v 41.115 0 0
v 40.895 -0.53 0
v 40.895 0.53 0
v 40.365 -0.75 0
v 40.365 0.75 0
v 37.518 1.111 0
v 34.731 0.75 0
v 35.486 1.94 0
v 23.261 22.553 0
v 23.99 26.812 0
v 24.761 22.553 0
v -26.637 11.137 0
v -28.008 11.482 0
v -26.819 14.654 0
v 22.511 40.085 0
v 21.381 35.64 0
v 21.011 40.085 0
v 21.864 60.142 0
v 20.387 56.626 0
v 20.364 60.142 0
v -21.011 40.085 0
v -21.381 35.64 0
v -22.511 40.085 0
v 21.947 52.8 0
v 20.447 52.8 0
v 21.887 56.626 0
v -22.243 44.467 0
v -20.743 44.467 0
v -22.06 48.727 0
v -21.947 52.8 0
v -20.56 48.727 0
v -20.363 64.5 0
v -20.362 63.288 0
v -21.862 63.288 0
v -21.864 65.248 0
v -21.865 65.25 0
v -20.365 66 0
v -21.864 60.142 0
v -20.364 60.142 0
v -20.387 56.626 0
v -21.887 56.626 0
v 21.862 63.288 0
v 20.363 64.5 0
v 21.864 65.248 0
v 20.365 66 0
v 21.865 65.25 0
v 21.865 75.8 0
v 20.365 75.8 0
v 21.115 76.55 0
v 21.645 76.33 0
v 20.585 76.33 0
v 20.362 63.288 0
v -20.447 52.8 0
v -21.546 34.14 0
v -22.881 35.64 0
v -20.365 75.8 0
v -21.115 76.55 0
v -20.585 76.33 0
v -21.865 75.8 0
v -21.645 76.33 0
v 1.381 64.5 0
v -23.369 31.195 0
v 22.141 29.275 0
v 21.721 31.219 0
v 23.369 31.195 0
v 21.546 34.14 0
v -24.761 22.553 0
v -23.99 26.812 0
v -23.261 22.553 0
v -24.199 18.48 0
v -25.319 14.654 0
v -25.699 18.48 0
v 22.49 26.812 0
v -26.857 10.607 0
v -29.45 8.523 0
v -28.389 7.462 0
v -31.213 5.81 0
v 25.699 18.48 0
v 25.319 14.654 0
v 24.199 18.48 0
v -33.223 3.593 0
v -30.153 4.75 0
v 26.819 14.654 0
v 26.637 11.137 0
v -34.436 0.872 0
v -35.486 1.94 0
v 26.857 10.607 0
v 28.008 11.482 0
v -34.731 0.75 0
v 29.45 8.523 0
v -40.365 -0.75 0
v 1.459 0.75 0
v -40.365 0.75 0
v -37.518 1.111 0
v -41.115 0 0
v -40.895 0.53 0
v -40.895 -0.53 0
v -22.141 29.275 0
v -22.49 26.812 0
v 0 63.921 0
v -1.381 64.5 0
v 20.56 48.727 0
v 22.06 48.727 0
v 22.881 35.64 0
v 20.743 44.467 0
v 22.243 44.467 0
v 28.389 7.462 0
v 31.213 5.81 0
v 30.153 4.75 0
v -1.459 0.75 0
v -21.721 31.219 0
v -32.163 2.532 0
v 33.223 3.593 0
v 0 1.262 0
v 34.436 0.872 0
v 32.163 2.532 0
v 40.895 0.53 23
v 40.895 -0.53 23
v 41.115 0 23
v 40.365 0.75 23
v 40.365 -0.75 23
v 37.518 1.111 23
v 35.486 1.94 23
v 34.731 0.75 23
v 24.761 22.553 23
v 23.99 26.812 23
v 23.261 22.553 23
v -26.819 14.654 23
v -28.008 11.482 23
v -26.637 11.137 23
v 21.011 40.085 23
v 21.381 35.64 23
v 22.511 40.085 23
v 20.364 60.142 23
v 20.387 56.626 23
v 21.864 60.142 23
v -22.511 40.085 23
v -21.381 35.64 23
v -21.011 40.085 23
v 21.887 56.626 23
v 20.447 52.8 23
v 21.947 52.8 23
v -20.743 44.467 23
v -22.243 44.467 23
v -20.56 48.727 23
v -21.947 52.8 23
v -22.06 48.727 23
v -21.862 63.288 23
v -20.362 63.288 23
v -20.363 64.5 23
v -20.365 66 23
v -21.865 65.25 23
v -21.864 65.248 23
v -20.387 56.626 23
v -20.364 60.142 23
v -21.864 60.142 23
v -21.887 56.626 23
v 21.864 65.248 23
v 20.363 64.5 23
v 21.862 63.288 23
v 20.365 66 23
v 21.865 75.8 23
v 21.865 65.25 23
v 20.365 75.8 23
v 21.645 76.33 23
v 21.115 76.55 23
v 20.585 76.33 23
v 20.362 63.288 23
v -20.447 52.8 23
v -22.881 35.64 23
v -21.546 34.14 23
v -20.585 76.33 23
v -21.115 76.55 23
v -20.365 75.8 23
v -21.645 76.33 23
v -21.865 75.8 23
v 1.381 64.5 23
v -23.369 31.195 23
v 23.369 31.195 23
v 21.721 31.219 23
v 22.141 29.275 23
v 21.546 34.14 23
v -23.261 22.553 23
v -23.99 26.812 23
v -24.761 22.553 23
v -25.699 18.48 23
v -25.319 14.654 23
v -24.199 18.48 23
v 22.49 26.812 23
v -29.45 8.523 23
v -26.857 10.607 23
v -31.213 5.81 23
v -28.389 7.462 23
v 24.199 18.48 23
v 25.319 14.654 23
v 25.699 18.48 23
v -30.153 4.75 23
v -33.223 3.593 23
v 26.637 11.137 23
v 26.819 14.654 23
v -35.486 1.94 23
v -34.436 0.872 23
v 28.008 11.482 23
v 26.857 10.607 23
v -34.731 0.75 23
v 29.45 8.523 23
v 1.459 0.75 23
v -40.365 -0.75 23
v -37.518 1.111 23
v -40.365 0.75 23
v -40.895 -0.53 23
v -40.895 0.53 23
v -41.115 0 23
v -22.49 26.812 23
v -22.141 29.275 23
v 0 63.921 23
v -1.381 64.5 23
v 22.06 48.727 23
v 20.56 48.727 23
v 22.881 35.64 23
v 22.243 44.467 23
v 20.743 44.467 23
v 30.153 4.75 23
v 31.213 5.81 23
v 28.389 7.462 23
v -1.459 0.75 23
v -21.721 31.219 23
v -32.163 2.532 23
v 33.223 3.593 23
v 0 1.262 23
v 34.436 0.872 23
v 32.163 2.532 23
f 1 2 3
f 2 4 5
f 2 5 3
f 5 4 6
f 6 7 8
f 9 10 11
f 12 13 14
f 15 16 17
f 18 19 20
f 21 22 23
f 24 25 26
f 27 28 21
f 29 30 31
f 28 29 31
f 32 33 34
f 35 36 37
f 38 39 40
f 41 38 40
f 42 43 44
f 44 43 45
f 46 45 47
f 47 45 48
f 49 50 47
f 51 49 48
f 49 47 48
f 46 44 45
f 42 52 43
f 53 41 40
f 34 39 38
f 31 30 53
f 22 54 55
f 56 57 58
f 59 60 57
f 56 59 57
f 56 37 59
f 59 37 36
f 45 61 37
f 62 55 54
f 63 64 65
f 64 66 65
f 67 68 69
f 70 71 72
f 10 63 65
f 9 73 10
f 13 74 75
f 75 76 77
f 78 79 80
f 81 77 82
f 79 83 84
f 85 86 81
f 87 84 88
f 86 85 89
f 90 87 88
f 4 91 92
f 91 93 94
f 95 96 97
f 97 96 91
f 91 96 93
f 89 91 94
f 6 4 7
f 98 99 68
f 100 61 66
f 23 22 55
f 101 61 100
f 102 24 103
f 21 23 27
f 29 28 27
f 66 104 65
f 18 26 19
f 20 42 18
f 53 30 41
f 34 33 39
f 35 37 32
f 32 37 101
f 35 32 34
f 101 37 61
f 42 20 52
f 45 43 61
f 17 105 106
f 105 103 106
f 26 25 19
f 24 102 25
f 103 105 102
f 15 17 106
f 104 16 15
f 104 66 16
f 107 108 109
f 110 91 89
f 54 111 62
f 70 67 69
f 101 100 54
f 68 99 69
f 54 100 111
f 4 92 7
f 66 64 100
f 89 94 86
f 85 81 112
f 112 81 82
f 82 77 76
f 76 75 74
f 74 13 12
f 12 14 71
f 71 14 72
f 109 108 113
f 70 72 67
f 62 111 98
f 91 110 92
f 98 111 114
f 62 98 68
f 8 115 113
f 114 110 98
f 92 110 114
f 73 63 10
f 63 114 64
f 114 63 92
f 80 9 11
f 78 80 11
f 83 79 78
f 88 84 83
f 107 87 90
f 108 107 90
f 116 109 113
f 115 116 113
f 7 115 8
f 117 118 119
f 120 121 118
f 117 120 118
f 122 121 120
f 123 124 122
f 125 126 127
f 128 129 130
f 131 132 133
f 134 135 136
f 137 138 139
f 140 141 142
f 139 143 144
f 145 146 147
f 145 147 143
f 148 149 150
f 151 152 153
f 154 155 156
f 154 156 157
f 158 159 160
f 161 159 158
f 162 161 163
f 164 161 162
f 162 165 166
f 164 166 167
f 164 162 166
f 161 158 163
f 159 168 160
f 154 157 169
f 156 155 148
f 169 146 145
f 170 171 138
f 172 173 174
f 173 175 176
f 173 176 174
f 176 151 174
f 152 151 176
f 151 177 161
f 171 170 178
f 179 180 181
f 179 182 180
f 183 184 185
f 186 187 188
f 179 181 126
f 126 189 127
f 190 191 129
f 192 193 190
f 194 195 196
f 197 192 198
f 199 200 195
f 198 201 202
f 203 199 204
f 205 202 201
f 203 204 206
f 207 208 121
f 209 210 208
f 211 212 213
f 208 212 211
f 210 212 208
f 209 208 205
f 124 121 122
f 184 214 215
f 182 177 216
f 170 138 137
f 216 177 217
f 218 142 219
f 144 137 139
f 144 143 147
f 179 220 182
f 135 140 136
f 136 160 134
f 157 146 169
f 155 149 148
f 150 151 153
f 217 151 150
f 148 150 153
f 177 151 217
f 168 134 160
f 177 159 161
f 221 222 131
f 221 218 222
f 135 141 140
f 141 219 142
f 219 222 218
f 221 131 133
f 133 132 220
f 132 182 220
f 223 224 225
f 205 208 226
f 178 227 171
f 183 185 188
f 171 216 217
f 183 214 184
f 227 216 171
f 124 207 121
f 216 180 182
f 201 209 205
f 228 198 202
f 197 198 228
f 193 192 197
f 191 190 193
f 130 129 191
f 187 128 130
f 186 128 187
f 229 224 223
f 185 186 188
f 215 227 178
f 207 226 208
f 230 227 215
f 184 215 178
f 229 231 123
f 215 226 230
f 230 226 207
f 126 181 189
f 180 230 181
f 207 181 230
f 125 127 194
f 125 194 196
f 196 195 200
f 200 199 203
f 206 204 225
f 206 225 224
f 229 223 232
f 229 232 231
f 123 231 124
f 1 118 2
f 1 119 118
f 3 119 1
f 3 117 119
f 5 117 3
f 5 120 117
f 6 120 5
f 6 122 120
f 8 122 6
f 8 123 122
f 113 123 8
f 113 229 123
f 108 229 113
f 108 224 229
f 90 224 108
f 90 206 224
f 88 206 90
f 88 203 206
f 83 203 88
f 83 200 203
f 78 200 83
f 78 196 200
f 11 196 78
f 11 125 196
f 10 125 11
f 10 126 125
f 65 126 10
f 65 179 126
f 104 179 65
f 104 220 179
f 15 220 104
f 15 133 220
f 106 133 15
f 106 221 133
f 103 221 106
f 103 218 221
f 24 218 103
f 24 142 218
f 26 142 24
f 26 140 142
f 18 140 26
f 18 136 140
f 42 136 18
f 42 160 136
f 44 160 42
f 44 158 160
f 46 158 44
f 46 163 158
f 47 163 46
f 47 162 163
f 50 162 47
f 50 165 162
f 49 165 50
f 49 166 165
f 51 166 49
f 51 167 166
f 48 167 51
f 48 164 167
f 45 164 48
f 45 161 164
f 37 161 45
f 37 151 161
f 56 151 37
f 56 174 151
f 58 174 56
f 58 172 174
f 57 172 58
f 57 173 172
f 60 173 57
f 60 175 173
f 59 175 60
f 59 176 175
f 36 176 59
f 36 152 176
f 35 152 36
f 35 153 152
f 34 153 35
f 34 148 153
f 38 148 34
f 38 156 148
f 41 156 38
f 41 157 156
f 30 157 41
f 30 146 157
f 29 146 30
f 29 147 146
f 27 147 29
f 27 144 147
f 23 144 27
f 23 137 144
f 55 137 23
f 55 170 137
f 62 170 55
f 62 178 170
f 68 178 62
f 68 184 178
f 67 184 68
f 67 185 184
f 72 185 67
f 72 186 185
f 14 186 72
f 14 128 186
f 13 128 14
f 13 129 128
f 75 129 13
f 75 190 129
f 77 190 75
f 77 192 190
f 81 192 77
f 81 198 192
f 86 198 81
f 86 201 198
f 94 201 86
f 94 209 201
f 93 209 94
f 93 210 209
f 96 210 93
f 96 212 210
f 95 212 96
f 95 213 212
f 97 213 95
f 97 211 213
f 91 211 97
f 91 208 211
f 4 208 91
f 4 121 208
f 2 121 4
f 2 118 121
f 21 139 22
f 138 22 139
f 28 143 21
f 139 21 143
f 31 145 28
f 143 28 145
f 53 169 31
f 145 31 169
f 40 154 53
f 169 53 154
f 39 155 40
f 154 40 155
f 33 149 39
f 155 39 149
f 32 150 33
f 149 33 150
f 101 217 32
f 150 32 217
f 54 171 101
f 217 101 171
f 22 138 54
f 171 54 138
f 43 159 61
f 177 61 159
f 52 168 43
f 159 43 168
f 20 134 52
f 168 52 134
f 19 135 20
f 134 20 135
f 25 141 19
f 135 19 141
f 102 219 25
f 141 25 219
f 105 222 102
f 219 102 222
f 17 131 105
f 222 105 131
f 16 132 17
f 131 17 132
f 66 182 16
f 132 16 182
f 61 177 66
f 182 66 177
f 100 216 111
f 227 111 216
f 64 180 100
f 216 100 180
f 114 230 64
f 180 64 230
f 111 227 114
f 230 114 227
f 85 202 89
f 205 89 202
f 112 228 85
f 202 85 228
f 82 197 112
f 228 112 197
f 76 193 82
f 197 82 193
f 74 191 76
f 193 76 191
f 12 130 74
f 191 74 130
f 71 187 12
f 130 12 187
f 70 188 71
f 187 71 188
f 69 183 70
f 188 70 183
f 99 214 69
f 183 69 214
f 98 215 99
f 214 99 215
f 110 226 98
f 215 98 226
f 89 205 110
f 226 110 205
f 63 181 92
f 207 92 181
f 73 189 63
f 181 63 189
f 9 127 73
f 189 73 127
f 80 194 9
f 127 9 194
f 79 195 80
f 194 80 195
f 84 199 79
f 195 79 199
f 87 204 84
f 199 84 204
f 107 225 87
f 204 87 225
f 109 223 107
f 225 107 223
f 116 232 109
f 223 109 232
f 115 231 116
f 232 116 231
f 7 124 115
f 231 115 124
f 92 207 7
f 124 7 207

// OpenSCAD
tolerance = 0; // Tolerance for track holder: negative=tighter, positive=looser
baseExtra = 20; // Distance base sticks out from the sides
bridgeHeight = 66; // Height of track holder above ground
bridgeWidth = 40.73; // Track width
supportDepth = 23; // Support depth
attachmentHeight = 9.8; // Track attachment height
thickness = 1.5; // Thickness of edges

module ribbon(points, thickness=1, closed=false) {
    p = closed ? concat(points, [points[0]]) : points;
    
    union() {
        for (i=[1:len(p)-1]) {
            hull() {
                translate(p[i-1]) circle(d=thickness, $fn=8);
                translate(p[i]) circle(d=thickness, $fn=8);
            }
        }
    }
}

// Public domain Bezier stuff from www.thingiverse.com/thing:8443
function BEZ03(u) = pow((1-u), 3);
function BEZ13(u) = 3*u*(pow((1-u),2));
function BEZ23(u) = 3*(pow(u,2))*(1-u);
function BEZ33(u) = pow(u,3);
function PointAlongBez4(p0, p1, p2, p3, u) = [
	BEZ03(u)*p0[0]+BEZ13(u)*p1[0]+BEZ23(u)*p2[0]+BEZ33(u)*p3[0],
	BEZ03(u)*p0[1]+BEZ13(u)*p1[1]+BEZ23(u)*p2[1]+BEZ33(u)*p3[1]];
// End public domain Bezier stuff

function PointsAlongBez4(p0, p1, p2, p3, precision=0.05) = [for (u=[0:precision:1]) PointAlongBez4(p0, p1, p2, p3, u) ];
    
function trivialMerge(list) = len(list) == 0 ? [] : list[0];
    
function merge(list) = len(list) <= 1 ? trivialMerge(list) : merge([for (i=[1:len(list)-1]) (i==1 ? concat(list[0],list[1]) : list[i])]);
    
function reflectX(list) = [for (i=[0:len(list)-1]) let(j=len(list)-1-i) [-list[j][0],list[j][1]]];

leftPoints = merge( [ [[0,0],[-baseExtra-bridgeWidth/2,0]], 
    PointsAlongBez4([-baseExtra-bridgeWidth/2,0], [(-baseExtra*0-bridgeWidth/2), 0], [-bridgeWidth/2-thickness/2-tolerance, bridgeHeight*0.75], [-bridgeWidth/2-thickness/2-tolerance, bridgeHeight]),
    [[-bridgeWidth/2-thickness/2-tolerance, bridgeHeight+attachmentHeight], 
    [-bridgeWidth/2-thickness/2-tolerance, bridgeHeight-thickness/2]]] ); 
rightPoints = reflectX(leftPoints);
crossBeam1 = [[0,0], leftPoints[13], [0,bridgeHeight-thickness/2]];

linear_extrude(height=supportDepth) union() {
    ribbon(concat(leftPoints,rightPoints),thickness=thickness);
    ribbon(crossBeam1,thickness=thickness);
    ribbon(reflectX(crossBeam1),thickness=thickness);
}
